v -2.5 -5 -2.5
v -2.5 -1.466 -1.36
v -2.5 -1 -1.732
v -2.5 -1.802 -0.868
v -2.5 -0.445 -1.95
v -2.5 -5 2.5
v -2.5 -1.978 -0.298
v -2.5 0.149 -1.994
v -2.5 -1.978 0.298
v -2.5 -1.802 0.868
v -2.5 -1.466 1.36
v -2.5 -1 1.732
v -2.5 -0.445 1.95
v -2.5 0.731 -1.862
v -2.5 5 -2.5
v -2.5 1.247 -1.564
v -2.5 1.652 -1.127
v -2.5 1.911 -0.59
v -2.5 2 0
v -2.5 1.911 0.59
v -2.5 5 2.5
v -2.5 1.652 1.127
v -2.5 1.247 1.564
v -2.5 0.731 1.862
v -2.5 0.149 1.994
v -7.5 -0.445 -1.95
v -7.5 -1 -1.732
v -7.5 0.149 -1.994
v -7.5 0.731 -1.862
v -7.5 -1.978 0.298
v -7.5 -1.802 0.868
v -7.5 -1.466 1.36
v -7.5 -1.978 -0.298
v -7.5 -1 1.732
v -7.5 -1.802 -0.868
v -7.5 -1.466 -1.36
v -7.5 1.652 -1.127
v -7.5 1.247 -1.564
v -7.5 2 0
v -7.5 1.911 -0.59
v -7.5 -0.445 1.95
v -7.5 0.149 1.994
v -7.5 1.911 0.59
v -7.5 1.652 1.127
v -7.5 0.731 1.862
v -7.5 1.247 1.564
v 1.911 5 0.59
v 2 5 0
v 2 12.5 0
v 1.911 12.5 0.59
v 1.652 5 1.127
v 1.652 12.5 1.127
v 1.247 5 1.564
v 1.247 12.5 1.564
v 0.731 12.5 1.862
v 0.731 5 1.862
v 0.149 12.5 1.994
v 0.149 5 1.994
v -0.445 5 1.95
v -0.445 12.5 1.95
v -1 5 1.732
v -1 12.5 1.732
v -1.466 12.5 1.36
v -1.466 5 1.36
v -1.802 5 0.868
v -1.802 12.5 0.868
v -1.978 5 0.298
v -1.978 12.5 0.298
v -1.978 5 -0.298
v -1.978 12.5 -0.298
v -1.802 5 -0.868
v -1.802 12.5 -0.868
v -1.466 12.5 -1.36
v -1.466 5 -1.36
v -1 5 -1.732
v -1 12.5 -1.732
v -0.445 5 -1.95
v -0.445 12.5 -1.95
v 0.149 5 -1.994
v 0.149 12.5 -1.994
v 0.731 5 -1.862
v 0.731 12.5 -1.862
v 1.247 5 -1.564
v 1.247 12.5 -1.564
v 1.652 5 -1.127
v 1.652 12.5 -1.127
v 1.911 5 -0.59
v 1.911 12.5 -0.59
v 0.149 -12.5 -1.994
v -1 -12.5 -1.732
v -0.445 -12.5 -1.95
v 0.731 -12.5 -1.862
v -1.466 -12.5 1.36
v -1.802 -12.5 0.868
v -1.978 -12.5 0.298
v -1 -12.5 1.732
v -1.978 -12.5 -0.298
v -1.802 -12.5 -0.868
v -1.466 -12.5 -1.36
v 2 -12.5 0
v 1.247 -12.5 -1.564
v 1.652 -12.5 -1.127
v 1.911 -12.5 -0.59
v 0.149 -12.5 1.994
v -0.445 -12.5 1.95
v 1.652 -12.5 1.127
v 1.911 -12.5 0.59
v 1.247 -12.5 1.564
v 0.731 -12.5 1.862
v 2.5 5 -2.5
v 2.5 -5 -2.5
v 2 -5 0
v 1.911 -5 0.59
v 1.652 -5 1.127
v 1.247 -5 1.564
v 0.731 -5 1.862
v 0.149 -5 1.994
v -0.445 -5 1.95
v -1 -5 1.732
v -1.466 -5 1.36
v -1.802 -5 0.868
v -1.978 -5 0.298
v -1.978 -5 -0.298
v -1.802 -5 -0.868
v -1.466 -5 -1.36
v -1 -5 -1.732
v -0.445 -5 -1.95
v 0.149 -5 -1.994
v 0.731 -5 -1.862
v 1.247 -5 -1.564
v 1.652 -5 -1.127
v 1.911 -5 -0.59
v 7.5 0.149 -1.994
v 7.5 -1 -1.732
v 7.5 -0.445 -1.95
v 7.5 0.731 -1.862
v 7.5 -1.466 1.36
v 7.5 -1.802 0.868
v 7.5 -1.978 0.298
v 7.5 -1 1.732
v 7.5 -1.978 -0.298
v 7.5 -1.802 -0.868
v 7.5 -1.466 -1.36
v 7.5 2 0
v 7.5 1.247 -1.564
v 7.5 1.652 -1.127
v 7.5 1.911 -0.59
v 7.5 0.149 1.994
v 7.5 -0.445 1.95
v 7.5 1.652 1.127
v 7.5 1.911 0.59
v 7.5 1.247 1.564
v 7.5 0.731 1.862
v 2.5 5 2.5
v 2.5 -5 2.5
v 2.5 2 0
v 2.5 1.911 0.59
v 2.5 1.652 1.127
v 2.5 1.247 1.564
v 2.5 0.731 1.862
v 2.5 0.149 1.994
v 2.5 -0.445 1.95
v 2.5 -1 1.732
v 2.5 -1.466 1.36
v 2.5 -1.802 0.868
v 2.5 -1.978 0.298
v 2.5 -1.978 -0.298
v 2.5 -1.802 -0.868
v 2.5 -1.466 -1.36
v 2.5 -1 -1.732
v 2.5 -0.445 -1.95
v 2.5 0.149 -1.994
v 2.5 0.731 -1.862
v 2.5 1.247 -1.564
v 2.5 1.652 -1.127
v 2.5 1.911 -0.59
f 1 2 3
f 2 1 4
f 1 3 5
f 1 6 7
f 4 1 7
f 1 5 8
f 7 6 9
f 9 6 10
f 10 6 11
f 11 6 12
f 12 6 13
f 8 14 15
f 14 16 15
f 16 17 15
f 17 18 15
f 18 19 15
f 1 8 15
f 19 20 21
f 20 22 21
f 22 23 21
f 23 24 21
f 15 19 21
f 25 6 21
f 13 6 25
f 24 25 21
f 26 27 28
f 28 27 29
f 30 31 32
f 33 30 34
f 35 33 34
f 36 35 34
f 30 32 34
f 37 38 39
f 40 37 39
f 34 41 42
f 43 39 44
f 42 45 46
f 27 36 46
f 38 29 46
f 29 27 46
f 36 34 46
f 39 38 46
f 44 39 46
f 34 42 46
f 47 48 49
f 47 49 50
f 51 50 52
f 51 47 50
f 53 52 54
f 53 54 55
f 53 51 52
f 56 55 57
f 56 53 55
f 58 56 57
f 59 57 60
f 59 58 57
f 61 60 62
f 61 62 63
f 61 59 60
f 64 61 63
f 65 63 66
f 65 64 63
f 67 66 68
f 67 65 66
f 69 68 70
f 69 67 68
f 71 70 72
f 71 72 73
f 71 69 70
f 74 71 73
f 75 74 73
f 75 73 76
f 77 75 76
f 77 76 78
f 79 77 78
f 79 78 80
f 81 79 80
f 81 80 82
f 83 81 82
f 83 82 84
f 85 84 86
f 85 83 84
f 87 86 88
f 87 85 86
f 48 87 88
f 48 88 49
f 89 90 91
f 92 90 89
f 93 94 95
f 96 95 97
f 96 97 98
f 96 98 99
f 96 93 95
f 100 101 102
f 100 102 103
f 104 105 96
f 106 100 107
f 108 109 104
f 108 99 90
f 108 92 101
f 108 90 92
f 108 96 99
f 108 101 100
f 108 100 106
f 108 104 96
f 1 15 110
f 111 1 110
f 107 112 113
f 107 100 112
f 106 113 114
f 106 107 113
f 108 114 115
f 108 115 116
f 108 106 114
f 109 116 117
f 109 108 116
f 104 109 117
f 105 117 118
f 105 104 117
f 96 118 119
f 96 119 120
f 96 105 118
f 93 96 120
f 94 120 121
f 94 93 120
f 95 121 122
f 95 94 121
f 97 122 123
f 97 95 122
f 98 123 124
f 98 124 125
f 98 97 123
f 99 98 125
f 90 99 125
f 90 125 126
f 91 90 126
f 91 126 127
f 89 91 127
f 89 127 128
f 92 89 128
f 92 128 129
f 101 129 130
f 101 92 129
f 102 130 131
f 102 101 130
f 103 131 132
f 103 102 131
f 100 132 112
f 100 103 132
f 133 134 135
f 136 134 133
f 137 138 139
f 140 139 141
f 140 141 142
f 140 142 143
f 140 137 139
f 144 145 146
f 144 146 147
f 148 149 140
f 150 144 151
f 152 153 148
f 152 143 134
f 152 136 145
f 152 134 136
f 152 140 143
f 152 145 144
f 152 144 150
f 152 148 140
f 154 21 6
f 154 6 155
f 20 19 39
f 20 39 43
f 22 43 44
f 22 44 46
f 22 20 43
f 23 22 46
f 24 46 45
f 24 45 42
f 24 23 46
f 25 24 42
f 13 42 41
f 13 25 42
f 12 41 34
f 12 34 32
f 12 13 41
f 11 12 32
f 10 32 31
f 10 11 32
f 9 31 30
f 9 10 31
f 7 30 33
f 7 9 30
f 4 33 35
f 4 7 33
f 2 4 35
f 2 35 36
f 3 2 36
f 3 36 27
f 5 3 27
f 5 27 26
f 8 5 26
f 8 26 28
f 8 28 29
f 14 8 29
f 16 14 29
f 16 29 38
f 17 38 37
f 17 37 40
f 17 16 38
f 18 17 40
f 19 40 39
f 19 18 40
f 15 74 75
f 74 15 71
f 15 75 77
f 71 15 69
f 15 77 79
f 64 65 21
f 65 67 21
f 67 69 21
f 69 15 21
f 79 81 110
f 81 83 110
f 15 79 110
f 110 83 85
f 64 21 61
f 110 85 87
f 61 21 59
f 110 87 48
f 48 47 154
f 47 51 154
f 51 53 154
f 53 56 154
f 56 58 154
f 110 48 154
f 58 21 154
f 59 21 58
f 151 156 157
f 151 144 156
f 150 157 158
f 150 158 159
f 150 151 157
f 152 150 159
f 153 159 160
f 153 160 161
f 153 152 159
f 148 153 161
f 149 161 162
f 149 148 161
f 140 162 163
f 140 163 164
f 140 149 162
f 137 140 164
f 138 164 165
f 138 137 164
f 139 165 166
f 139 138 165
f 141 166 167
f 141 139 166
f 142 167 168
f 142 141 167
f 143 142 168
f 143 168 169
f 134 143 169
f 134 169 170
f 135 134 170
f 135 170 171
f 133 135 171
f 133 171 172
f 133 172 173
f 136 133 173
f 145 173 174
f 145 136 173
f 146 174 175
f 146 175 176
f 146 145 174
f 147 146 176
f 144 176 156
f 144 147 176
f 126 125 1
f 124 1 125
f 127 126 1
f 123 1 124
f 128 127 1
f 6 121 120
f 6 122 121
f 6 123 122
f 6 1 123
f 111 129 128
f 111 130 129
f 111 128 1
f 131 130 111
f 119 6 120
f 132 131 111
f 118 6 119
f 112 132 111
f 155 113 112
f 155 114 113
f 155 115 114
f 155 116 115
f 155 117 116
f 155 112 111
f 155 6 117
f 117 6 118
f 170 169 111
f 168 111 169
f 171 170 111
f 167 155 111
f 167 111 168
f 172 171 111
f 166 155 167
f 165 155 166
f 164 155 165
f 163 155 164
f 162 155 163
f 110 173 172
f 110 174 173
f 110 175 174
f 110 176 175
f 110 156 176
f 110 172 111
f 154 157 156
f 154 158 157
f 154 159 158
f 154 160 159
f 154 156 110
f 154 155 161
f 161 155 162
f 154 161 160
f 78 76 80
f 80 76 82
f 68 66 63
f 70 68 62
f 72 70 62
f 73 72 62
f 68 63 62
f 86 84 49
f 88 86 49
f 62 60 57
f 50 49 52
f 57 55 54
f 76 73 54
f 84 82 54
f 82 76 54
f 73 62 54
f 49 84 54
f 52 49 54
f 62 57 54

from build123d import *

# Parameters (mm, degrees)
F0_W     = 5
F0_H     = 10
F1_DEPTH = 2.5
F2_R     = 2
F3_DEPTH = 12.5
F4_R     = 2
F5_DEPTH = 7.5


with BuildPart() as f1:
    # F0 (on Top) → F1 (new body, symmetric)
    with BuildSketch(Plane.XY):
        Rectangle(F0_W, F0_H)
    extrude(amount=F1_DEPTH, both=True)

    # F2 (on Front) → F3 (join, symmetric)
    with BuildSketch(Plane.XZ):
        Circle(F2_R)
    extrude(amount=F3_DEPTH, both=True)

    # F4 (on Right) → F5 (join, symmetric)
    with BuildSketch(Plane.YZ):
        Circle(F4_R)
    extrude(amount=F5_DEPTH, both=True)


solid = f1.part
